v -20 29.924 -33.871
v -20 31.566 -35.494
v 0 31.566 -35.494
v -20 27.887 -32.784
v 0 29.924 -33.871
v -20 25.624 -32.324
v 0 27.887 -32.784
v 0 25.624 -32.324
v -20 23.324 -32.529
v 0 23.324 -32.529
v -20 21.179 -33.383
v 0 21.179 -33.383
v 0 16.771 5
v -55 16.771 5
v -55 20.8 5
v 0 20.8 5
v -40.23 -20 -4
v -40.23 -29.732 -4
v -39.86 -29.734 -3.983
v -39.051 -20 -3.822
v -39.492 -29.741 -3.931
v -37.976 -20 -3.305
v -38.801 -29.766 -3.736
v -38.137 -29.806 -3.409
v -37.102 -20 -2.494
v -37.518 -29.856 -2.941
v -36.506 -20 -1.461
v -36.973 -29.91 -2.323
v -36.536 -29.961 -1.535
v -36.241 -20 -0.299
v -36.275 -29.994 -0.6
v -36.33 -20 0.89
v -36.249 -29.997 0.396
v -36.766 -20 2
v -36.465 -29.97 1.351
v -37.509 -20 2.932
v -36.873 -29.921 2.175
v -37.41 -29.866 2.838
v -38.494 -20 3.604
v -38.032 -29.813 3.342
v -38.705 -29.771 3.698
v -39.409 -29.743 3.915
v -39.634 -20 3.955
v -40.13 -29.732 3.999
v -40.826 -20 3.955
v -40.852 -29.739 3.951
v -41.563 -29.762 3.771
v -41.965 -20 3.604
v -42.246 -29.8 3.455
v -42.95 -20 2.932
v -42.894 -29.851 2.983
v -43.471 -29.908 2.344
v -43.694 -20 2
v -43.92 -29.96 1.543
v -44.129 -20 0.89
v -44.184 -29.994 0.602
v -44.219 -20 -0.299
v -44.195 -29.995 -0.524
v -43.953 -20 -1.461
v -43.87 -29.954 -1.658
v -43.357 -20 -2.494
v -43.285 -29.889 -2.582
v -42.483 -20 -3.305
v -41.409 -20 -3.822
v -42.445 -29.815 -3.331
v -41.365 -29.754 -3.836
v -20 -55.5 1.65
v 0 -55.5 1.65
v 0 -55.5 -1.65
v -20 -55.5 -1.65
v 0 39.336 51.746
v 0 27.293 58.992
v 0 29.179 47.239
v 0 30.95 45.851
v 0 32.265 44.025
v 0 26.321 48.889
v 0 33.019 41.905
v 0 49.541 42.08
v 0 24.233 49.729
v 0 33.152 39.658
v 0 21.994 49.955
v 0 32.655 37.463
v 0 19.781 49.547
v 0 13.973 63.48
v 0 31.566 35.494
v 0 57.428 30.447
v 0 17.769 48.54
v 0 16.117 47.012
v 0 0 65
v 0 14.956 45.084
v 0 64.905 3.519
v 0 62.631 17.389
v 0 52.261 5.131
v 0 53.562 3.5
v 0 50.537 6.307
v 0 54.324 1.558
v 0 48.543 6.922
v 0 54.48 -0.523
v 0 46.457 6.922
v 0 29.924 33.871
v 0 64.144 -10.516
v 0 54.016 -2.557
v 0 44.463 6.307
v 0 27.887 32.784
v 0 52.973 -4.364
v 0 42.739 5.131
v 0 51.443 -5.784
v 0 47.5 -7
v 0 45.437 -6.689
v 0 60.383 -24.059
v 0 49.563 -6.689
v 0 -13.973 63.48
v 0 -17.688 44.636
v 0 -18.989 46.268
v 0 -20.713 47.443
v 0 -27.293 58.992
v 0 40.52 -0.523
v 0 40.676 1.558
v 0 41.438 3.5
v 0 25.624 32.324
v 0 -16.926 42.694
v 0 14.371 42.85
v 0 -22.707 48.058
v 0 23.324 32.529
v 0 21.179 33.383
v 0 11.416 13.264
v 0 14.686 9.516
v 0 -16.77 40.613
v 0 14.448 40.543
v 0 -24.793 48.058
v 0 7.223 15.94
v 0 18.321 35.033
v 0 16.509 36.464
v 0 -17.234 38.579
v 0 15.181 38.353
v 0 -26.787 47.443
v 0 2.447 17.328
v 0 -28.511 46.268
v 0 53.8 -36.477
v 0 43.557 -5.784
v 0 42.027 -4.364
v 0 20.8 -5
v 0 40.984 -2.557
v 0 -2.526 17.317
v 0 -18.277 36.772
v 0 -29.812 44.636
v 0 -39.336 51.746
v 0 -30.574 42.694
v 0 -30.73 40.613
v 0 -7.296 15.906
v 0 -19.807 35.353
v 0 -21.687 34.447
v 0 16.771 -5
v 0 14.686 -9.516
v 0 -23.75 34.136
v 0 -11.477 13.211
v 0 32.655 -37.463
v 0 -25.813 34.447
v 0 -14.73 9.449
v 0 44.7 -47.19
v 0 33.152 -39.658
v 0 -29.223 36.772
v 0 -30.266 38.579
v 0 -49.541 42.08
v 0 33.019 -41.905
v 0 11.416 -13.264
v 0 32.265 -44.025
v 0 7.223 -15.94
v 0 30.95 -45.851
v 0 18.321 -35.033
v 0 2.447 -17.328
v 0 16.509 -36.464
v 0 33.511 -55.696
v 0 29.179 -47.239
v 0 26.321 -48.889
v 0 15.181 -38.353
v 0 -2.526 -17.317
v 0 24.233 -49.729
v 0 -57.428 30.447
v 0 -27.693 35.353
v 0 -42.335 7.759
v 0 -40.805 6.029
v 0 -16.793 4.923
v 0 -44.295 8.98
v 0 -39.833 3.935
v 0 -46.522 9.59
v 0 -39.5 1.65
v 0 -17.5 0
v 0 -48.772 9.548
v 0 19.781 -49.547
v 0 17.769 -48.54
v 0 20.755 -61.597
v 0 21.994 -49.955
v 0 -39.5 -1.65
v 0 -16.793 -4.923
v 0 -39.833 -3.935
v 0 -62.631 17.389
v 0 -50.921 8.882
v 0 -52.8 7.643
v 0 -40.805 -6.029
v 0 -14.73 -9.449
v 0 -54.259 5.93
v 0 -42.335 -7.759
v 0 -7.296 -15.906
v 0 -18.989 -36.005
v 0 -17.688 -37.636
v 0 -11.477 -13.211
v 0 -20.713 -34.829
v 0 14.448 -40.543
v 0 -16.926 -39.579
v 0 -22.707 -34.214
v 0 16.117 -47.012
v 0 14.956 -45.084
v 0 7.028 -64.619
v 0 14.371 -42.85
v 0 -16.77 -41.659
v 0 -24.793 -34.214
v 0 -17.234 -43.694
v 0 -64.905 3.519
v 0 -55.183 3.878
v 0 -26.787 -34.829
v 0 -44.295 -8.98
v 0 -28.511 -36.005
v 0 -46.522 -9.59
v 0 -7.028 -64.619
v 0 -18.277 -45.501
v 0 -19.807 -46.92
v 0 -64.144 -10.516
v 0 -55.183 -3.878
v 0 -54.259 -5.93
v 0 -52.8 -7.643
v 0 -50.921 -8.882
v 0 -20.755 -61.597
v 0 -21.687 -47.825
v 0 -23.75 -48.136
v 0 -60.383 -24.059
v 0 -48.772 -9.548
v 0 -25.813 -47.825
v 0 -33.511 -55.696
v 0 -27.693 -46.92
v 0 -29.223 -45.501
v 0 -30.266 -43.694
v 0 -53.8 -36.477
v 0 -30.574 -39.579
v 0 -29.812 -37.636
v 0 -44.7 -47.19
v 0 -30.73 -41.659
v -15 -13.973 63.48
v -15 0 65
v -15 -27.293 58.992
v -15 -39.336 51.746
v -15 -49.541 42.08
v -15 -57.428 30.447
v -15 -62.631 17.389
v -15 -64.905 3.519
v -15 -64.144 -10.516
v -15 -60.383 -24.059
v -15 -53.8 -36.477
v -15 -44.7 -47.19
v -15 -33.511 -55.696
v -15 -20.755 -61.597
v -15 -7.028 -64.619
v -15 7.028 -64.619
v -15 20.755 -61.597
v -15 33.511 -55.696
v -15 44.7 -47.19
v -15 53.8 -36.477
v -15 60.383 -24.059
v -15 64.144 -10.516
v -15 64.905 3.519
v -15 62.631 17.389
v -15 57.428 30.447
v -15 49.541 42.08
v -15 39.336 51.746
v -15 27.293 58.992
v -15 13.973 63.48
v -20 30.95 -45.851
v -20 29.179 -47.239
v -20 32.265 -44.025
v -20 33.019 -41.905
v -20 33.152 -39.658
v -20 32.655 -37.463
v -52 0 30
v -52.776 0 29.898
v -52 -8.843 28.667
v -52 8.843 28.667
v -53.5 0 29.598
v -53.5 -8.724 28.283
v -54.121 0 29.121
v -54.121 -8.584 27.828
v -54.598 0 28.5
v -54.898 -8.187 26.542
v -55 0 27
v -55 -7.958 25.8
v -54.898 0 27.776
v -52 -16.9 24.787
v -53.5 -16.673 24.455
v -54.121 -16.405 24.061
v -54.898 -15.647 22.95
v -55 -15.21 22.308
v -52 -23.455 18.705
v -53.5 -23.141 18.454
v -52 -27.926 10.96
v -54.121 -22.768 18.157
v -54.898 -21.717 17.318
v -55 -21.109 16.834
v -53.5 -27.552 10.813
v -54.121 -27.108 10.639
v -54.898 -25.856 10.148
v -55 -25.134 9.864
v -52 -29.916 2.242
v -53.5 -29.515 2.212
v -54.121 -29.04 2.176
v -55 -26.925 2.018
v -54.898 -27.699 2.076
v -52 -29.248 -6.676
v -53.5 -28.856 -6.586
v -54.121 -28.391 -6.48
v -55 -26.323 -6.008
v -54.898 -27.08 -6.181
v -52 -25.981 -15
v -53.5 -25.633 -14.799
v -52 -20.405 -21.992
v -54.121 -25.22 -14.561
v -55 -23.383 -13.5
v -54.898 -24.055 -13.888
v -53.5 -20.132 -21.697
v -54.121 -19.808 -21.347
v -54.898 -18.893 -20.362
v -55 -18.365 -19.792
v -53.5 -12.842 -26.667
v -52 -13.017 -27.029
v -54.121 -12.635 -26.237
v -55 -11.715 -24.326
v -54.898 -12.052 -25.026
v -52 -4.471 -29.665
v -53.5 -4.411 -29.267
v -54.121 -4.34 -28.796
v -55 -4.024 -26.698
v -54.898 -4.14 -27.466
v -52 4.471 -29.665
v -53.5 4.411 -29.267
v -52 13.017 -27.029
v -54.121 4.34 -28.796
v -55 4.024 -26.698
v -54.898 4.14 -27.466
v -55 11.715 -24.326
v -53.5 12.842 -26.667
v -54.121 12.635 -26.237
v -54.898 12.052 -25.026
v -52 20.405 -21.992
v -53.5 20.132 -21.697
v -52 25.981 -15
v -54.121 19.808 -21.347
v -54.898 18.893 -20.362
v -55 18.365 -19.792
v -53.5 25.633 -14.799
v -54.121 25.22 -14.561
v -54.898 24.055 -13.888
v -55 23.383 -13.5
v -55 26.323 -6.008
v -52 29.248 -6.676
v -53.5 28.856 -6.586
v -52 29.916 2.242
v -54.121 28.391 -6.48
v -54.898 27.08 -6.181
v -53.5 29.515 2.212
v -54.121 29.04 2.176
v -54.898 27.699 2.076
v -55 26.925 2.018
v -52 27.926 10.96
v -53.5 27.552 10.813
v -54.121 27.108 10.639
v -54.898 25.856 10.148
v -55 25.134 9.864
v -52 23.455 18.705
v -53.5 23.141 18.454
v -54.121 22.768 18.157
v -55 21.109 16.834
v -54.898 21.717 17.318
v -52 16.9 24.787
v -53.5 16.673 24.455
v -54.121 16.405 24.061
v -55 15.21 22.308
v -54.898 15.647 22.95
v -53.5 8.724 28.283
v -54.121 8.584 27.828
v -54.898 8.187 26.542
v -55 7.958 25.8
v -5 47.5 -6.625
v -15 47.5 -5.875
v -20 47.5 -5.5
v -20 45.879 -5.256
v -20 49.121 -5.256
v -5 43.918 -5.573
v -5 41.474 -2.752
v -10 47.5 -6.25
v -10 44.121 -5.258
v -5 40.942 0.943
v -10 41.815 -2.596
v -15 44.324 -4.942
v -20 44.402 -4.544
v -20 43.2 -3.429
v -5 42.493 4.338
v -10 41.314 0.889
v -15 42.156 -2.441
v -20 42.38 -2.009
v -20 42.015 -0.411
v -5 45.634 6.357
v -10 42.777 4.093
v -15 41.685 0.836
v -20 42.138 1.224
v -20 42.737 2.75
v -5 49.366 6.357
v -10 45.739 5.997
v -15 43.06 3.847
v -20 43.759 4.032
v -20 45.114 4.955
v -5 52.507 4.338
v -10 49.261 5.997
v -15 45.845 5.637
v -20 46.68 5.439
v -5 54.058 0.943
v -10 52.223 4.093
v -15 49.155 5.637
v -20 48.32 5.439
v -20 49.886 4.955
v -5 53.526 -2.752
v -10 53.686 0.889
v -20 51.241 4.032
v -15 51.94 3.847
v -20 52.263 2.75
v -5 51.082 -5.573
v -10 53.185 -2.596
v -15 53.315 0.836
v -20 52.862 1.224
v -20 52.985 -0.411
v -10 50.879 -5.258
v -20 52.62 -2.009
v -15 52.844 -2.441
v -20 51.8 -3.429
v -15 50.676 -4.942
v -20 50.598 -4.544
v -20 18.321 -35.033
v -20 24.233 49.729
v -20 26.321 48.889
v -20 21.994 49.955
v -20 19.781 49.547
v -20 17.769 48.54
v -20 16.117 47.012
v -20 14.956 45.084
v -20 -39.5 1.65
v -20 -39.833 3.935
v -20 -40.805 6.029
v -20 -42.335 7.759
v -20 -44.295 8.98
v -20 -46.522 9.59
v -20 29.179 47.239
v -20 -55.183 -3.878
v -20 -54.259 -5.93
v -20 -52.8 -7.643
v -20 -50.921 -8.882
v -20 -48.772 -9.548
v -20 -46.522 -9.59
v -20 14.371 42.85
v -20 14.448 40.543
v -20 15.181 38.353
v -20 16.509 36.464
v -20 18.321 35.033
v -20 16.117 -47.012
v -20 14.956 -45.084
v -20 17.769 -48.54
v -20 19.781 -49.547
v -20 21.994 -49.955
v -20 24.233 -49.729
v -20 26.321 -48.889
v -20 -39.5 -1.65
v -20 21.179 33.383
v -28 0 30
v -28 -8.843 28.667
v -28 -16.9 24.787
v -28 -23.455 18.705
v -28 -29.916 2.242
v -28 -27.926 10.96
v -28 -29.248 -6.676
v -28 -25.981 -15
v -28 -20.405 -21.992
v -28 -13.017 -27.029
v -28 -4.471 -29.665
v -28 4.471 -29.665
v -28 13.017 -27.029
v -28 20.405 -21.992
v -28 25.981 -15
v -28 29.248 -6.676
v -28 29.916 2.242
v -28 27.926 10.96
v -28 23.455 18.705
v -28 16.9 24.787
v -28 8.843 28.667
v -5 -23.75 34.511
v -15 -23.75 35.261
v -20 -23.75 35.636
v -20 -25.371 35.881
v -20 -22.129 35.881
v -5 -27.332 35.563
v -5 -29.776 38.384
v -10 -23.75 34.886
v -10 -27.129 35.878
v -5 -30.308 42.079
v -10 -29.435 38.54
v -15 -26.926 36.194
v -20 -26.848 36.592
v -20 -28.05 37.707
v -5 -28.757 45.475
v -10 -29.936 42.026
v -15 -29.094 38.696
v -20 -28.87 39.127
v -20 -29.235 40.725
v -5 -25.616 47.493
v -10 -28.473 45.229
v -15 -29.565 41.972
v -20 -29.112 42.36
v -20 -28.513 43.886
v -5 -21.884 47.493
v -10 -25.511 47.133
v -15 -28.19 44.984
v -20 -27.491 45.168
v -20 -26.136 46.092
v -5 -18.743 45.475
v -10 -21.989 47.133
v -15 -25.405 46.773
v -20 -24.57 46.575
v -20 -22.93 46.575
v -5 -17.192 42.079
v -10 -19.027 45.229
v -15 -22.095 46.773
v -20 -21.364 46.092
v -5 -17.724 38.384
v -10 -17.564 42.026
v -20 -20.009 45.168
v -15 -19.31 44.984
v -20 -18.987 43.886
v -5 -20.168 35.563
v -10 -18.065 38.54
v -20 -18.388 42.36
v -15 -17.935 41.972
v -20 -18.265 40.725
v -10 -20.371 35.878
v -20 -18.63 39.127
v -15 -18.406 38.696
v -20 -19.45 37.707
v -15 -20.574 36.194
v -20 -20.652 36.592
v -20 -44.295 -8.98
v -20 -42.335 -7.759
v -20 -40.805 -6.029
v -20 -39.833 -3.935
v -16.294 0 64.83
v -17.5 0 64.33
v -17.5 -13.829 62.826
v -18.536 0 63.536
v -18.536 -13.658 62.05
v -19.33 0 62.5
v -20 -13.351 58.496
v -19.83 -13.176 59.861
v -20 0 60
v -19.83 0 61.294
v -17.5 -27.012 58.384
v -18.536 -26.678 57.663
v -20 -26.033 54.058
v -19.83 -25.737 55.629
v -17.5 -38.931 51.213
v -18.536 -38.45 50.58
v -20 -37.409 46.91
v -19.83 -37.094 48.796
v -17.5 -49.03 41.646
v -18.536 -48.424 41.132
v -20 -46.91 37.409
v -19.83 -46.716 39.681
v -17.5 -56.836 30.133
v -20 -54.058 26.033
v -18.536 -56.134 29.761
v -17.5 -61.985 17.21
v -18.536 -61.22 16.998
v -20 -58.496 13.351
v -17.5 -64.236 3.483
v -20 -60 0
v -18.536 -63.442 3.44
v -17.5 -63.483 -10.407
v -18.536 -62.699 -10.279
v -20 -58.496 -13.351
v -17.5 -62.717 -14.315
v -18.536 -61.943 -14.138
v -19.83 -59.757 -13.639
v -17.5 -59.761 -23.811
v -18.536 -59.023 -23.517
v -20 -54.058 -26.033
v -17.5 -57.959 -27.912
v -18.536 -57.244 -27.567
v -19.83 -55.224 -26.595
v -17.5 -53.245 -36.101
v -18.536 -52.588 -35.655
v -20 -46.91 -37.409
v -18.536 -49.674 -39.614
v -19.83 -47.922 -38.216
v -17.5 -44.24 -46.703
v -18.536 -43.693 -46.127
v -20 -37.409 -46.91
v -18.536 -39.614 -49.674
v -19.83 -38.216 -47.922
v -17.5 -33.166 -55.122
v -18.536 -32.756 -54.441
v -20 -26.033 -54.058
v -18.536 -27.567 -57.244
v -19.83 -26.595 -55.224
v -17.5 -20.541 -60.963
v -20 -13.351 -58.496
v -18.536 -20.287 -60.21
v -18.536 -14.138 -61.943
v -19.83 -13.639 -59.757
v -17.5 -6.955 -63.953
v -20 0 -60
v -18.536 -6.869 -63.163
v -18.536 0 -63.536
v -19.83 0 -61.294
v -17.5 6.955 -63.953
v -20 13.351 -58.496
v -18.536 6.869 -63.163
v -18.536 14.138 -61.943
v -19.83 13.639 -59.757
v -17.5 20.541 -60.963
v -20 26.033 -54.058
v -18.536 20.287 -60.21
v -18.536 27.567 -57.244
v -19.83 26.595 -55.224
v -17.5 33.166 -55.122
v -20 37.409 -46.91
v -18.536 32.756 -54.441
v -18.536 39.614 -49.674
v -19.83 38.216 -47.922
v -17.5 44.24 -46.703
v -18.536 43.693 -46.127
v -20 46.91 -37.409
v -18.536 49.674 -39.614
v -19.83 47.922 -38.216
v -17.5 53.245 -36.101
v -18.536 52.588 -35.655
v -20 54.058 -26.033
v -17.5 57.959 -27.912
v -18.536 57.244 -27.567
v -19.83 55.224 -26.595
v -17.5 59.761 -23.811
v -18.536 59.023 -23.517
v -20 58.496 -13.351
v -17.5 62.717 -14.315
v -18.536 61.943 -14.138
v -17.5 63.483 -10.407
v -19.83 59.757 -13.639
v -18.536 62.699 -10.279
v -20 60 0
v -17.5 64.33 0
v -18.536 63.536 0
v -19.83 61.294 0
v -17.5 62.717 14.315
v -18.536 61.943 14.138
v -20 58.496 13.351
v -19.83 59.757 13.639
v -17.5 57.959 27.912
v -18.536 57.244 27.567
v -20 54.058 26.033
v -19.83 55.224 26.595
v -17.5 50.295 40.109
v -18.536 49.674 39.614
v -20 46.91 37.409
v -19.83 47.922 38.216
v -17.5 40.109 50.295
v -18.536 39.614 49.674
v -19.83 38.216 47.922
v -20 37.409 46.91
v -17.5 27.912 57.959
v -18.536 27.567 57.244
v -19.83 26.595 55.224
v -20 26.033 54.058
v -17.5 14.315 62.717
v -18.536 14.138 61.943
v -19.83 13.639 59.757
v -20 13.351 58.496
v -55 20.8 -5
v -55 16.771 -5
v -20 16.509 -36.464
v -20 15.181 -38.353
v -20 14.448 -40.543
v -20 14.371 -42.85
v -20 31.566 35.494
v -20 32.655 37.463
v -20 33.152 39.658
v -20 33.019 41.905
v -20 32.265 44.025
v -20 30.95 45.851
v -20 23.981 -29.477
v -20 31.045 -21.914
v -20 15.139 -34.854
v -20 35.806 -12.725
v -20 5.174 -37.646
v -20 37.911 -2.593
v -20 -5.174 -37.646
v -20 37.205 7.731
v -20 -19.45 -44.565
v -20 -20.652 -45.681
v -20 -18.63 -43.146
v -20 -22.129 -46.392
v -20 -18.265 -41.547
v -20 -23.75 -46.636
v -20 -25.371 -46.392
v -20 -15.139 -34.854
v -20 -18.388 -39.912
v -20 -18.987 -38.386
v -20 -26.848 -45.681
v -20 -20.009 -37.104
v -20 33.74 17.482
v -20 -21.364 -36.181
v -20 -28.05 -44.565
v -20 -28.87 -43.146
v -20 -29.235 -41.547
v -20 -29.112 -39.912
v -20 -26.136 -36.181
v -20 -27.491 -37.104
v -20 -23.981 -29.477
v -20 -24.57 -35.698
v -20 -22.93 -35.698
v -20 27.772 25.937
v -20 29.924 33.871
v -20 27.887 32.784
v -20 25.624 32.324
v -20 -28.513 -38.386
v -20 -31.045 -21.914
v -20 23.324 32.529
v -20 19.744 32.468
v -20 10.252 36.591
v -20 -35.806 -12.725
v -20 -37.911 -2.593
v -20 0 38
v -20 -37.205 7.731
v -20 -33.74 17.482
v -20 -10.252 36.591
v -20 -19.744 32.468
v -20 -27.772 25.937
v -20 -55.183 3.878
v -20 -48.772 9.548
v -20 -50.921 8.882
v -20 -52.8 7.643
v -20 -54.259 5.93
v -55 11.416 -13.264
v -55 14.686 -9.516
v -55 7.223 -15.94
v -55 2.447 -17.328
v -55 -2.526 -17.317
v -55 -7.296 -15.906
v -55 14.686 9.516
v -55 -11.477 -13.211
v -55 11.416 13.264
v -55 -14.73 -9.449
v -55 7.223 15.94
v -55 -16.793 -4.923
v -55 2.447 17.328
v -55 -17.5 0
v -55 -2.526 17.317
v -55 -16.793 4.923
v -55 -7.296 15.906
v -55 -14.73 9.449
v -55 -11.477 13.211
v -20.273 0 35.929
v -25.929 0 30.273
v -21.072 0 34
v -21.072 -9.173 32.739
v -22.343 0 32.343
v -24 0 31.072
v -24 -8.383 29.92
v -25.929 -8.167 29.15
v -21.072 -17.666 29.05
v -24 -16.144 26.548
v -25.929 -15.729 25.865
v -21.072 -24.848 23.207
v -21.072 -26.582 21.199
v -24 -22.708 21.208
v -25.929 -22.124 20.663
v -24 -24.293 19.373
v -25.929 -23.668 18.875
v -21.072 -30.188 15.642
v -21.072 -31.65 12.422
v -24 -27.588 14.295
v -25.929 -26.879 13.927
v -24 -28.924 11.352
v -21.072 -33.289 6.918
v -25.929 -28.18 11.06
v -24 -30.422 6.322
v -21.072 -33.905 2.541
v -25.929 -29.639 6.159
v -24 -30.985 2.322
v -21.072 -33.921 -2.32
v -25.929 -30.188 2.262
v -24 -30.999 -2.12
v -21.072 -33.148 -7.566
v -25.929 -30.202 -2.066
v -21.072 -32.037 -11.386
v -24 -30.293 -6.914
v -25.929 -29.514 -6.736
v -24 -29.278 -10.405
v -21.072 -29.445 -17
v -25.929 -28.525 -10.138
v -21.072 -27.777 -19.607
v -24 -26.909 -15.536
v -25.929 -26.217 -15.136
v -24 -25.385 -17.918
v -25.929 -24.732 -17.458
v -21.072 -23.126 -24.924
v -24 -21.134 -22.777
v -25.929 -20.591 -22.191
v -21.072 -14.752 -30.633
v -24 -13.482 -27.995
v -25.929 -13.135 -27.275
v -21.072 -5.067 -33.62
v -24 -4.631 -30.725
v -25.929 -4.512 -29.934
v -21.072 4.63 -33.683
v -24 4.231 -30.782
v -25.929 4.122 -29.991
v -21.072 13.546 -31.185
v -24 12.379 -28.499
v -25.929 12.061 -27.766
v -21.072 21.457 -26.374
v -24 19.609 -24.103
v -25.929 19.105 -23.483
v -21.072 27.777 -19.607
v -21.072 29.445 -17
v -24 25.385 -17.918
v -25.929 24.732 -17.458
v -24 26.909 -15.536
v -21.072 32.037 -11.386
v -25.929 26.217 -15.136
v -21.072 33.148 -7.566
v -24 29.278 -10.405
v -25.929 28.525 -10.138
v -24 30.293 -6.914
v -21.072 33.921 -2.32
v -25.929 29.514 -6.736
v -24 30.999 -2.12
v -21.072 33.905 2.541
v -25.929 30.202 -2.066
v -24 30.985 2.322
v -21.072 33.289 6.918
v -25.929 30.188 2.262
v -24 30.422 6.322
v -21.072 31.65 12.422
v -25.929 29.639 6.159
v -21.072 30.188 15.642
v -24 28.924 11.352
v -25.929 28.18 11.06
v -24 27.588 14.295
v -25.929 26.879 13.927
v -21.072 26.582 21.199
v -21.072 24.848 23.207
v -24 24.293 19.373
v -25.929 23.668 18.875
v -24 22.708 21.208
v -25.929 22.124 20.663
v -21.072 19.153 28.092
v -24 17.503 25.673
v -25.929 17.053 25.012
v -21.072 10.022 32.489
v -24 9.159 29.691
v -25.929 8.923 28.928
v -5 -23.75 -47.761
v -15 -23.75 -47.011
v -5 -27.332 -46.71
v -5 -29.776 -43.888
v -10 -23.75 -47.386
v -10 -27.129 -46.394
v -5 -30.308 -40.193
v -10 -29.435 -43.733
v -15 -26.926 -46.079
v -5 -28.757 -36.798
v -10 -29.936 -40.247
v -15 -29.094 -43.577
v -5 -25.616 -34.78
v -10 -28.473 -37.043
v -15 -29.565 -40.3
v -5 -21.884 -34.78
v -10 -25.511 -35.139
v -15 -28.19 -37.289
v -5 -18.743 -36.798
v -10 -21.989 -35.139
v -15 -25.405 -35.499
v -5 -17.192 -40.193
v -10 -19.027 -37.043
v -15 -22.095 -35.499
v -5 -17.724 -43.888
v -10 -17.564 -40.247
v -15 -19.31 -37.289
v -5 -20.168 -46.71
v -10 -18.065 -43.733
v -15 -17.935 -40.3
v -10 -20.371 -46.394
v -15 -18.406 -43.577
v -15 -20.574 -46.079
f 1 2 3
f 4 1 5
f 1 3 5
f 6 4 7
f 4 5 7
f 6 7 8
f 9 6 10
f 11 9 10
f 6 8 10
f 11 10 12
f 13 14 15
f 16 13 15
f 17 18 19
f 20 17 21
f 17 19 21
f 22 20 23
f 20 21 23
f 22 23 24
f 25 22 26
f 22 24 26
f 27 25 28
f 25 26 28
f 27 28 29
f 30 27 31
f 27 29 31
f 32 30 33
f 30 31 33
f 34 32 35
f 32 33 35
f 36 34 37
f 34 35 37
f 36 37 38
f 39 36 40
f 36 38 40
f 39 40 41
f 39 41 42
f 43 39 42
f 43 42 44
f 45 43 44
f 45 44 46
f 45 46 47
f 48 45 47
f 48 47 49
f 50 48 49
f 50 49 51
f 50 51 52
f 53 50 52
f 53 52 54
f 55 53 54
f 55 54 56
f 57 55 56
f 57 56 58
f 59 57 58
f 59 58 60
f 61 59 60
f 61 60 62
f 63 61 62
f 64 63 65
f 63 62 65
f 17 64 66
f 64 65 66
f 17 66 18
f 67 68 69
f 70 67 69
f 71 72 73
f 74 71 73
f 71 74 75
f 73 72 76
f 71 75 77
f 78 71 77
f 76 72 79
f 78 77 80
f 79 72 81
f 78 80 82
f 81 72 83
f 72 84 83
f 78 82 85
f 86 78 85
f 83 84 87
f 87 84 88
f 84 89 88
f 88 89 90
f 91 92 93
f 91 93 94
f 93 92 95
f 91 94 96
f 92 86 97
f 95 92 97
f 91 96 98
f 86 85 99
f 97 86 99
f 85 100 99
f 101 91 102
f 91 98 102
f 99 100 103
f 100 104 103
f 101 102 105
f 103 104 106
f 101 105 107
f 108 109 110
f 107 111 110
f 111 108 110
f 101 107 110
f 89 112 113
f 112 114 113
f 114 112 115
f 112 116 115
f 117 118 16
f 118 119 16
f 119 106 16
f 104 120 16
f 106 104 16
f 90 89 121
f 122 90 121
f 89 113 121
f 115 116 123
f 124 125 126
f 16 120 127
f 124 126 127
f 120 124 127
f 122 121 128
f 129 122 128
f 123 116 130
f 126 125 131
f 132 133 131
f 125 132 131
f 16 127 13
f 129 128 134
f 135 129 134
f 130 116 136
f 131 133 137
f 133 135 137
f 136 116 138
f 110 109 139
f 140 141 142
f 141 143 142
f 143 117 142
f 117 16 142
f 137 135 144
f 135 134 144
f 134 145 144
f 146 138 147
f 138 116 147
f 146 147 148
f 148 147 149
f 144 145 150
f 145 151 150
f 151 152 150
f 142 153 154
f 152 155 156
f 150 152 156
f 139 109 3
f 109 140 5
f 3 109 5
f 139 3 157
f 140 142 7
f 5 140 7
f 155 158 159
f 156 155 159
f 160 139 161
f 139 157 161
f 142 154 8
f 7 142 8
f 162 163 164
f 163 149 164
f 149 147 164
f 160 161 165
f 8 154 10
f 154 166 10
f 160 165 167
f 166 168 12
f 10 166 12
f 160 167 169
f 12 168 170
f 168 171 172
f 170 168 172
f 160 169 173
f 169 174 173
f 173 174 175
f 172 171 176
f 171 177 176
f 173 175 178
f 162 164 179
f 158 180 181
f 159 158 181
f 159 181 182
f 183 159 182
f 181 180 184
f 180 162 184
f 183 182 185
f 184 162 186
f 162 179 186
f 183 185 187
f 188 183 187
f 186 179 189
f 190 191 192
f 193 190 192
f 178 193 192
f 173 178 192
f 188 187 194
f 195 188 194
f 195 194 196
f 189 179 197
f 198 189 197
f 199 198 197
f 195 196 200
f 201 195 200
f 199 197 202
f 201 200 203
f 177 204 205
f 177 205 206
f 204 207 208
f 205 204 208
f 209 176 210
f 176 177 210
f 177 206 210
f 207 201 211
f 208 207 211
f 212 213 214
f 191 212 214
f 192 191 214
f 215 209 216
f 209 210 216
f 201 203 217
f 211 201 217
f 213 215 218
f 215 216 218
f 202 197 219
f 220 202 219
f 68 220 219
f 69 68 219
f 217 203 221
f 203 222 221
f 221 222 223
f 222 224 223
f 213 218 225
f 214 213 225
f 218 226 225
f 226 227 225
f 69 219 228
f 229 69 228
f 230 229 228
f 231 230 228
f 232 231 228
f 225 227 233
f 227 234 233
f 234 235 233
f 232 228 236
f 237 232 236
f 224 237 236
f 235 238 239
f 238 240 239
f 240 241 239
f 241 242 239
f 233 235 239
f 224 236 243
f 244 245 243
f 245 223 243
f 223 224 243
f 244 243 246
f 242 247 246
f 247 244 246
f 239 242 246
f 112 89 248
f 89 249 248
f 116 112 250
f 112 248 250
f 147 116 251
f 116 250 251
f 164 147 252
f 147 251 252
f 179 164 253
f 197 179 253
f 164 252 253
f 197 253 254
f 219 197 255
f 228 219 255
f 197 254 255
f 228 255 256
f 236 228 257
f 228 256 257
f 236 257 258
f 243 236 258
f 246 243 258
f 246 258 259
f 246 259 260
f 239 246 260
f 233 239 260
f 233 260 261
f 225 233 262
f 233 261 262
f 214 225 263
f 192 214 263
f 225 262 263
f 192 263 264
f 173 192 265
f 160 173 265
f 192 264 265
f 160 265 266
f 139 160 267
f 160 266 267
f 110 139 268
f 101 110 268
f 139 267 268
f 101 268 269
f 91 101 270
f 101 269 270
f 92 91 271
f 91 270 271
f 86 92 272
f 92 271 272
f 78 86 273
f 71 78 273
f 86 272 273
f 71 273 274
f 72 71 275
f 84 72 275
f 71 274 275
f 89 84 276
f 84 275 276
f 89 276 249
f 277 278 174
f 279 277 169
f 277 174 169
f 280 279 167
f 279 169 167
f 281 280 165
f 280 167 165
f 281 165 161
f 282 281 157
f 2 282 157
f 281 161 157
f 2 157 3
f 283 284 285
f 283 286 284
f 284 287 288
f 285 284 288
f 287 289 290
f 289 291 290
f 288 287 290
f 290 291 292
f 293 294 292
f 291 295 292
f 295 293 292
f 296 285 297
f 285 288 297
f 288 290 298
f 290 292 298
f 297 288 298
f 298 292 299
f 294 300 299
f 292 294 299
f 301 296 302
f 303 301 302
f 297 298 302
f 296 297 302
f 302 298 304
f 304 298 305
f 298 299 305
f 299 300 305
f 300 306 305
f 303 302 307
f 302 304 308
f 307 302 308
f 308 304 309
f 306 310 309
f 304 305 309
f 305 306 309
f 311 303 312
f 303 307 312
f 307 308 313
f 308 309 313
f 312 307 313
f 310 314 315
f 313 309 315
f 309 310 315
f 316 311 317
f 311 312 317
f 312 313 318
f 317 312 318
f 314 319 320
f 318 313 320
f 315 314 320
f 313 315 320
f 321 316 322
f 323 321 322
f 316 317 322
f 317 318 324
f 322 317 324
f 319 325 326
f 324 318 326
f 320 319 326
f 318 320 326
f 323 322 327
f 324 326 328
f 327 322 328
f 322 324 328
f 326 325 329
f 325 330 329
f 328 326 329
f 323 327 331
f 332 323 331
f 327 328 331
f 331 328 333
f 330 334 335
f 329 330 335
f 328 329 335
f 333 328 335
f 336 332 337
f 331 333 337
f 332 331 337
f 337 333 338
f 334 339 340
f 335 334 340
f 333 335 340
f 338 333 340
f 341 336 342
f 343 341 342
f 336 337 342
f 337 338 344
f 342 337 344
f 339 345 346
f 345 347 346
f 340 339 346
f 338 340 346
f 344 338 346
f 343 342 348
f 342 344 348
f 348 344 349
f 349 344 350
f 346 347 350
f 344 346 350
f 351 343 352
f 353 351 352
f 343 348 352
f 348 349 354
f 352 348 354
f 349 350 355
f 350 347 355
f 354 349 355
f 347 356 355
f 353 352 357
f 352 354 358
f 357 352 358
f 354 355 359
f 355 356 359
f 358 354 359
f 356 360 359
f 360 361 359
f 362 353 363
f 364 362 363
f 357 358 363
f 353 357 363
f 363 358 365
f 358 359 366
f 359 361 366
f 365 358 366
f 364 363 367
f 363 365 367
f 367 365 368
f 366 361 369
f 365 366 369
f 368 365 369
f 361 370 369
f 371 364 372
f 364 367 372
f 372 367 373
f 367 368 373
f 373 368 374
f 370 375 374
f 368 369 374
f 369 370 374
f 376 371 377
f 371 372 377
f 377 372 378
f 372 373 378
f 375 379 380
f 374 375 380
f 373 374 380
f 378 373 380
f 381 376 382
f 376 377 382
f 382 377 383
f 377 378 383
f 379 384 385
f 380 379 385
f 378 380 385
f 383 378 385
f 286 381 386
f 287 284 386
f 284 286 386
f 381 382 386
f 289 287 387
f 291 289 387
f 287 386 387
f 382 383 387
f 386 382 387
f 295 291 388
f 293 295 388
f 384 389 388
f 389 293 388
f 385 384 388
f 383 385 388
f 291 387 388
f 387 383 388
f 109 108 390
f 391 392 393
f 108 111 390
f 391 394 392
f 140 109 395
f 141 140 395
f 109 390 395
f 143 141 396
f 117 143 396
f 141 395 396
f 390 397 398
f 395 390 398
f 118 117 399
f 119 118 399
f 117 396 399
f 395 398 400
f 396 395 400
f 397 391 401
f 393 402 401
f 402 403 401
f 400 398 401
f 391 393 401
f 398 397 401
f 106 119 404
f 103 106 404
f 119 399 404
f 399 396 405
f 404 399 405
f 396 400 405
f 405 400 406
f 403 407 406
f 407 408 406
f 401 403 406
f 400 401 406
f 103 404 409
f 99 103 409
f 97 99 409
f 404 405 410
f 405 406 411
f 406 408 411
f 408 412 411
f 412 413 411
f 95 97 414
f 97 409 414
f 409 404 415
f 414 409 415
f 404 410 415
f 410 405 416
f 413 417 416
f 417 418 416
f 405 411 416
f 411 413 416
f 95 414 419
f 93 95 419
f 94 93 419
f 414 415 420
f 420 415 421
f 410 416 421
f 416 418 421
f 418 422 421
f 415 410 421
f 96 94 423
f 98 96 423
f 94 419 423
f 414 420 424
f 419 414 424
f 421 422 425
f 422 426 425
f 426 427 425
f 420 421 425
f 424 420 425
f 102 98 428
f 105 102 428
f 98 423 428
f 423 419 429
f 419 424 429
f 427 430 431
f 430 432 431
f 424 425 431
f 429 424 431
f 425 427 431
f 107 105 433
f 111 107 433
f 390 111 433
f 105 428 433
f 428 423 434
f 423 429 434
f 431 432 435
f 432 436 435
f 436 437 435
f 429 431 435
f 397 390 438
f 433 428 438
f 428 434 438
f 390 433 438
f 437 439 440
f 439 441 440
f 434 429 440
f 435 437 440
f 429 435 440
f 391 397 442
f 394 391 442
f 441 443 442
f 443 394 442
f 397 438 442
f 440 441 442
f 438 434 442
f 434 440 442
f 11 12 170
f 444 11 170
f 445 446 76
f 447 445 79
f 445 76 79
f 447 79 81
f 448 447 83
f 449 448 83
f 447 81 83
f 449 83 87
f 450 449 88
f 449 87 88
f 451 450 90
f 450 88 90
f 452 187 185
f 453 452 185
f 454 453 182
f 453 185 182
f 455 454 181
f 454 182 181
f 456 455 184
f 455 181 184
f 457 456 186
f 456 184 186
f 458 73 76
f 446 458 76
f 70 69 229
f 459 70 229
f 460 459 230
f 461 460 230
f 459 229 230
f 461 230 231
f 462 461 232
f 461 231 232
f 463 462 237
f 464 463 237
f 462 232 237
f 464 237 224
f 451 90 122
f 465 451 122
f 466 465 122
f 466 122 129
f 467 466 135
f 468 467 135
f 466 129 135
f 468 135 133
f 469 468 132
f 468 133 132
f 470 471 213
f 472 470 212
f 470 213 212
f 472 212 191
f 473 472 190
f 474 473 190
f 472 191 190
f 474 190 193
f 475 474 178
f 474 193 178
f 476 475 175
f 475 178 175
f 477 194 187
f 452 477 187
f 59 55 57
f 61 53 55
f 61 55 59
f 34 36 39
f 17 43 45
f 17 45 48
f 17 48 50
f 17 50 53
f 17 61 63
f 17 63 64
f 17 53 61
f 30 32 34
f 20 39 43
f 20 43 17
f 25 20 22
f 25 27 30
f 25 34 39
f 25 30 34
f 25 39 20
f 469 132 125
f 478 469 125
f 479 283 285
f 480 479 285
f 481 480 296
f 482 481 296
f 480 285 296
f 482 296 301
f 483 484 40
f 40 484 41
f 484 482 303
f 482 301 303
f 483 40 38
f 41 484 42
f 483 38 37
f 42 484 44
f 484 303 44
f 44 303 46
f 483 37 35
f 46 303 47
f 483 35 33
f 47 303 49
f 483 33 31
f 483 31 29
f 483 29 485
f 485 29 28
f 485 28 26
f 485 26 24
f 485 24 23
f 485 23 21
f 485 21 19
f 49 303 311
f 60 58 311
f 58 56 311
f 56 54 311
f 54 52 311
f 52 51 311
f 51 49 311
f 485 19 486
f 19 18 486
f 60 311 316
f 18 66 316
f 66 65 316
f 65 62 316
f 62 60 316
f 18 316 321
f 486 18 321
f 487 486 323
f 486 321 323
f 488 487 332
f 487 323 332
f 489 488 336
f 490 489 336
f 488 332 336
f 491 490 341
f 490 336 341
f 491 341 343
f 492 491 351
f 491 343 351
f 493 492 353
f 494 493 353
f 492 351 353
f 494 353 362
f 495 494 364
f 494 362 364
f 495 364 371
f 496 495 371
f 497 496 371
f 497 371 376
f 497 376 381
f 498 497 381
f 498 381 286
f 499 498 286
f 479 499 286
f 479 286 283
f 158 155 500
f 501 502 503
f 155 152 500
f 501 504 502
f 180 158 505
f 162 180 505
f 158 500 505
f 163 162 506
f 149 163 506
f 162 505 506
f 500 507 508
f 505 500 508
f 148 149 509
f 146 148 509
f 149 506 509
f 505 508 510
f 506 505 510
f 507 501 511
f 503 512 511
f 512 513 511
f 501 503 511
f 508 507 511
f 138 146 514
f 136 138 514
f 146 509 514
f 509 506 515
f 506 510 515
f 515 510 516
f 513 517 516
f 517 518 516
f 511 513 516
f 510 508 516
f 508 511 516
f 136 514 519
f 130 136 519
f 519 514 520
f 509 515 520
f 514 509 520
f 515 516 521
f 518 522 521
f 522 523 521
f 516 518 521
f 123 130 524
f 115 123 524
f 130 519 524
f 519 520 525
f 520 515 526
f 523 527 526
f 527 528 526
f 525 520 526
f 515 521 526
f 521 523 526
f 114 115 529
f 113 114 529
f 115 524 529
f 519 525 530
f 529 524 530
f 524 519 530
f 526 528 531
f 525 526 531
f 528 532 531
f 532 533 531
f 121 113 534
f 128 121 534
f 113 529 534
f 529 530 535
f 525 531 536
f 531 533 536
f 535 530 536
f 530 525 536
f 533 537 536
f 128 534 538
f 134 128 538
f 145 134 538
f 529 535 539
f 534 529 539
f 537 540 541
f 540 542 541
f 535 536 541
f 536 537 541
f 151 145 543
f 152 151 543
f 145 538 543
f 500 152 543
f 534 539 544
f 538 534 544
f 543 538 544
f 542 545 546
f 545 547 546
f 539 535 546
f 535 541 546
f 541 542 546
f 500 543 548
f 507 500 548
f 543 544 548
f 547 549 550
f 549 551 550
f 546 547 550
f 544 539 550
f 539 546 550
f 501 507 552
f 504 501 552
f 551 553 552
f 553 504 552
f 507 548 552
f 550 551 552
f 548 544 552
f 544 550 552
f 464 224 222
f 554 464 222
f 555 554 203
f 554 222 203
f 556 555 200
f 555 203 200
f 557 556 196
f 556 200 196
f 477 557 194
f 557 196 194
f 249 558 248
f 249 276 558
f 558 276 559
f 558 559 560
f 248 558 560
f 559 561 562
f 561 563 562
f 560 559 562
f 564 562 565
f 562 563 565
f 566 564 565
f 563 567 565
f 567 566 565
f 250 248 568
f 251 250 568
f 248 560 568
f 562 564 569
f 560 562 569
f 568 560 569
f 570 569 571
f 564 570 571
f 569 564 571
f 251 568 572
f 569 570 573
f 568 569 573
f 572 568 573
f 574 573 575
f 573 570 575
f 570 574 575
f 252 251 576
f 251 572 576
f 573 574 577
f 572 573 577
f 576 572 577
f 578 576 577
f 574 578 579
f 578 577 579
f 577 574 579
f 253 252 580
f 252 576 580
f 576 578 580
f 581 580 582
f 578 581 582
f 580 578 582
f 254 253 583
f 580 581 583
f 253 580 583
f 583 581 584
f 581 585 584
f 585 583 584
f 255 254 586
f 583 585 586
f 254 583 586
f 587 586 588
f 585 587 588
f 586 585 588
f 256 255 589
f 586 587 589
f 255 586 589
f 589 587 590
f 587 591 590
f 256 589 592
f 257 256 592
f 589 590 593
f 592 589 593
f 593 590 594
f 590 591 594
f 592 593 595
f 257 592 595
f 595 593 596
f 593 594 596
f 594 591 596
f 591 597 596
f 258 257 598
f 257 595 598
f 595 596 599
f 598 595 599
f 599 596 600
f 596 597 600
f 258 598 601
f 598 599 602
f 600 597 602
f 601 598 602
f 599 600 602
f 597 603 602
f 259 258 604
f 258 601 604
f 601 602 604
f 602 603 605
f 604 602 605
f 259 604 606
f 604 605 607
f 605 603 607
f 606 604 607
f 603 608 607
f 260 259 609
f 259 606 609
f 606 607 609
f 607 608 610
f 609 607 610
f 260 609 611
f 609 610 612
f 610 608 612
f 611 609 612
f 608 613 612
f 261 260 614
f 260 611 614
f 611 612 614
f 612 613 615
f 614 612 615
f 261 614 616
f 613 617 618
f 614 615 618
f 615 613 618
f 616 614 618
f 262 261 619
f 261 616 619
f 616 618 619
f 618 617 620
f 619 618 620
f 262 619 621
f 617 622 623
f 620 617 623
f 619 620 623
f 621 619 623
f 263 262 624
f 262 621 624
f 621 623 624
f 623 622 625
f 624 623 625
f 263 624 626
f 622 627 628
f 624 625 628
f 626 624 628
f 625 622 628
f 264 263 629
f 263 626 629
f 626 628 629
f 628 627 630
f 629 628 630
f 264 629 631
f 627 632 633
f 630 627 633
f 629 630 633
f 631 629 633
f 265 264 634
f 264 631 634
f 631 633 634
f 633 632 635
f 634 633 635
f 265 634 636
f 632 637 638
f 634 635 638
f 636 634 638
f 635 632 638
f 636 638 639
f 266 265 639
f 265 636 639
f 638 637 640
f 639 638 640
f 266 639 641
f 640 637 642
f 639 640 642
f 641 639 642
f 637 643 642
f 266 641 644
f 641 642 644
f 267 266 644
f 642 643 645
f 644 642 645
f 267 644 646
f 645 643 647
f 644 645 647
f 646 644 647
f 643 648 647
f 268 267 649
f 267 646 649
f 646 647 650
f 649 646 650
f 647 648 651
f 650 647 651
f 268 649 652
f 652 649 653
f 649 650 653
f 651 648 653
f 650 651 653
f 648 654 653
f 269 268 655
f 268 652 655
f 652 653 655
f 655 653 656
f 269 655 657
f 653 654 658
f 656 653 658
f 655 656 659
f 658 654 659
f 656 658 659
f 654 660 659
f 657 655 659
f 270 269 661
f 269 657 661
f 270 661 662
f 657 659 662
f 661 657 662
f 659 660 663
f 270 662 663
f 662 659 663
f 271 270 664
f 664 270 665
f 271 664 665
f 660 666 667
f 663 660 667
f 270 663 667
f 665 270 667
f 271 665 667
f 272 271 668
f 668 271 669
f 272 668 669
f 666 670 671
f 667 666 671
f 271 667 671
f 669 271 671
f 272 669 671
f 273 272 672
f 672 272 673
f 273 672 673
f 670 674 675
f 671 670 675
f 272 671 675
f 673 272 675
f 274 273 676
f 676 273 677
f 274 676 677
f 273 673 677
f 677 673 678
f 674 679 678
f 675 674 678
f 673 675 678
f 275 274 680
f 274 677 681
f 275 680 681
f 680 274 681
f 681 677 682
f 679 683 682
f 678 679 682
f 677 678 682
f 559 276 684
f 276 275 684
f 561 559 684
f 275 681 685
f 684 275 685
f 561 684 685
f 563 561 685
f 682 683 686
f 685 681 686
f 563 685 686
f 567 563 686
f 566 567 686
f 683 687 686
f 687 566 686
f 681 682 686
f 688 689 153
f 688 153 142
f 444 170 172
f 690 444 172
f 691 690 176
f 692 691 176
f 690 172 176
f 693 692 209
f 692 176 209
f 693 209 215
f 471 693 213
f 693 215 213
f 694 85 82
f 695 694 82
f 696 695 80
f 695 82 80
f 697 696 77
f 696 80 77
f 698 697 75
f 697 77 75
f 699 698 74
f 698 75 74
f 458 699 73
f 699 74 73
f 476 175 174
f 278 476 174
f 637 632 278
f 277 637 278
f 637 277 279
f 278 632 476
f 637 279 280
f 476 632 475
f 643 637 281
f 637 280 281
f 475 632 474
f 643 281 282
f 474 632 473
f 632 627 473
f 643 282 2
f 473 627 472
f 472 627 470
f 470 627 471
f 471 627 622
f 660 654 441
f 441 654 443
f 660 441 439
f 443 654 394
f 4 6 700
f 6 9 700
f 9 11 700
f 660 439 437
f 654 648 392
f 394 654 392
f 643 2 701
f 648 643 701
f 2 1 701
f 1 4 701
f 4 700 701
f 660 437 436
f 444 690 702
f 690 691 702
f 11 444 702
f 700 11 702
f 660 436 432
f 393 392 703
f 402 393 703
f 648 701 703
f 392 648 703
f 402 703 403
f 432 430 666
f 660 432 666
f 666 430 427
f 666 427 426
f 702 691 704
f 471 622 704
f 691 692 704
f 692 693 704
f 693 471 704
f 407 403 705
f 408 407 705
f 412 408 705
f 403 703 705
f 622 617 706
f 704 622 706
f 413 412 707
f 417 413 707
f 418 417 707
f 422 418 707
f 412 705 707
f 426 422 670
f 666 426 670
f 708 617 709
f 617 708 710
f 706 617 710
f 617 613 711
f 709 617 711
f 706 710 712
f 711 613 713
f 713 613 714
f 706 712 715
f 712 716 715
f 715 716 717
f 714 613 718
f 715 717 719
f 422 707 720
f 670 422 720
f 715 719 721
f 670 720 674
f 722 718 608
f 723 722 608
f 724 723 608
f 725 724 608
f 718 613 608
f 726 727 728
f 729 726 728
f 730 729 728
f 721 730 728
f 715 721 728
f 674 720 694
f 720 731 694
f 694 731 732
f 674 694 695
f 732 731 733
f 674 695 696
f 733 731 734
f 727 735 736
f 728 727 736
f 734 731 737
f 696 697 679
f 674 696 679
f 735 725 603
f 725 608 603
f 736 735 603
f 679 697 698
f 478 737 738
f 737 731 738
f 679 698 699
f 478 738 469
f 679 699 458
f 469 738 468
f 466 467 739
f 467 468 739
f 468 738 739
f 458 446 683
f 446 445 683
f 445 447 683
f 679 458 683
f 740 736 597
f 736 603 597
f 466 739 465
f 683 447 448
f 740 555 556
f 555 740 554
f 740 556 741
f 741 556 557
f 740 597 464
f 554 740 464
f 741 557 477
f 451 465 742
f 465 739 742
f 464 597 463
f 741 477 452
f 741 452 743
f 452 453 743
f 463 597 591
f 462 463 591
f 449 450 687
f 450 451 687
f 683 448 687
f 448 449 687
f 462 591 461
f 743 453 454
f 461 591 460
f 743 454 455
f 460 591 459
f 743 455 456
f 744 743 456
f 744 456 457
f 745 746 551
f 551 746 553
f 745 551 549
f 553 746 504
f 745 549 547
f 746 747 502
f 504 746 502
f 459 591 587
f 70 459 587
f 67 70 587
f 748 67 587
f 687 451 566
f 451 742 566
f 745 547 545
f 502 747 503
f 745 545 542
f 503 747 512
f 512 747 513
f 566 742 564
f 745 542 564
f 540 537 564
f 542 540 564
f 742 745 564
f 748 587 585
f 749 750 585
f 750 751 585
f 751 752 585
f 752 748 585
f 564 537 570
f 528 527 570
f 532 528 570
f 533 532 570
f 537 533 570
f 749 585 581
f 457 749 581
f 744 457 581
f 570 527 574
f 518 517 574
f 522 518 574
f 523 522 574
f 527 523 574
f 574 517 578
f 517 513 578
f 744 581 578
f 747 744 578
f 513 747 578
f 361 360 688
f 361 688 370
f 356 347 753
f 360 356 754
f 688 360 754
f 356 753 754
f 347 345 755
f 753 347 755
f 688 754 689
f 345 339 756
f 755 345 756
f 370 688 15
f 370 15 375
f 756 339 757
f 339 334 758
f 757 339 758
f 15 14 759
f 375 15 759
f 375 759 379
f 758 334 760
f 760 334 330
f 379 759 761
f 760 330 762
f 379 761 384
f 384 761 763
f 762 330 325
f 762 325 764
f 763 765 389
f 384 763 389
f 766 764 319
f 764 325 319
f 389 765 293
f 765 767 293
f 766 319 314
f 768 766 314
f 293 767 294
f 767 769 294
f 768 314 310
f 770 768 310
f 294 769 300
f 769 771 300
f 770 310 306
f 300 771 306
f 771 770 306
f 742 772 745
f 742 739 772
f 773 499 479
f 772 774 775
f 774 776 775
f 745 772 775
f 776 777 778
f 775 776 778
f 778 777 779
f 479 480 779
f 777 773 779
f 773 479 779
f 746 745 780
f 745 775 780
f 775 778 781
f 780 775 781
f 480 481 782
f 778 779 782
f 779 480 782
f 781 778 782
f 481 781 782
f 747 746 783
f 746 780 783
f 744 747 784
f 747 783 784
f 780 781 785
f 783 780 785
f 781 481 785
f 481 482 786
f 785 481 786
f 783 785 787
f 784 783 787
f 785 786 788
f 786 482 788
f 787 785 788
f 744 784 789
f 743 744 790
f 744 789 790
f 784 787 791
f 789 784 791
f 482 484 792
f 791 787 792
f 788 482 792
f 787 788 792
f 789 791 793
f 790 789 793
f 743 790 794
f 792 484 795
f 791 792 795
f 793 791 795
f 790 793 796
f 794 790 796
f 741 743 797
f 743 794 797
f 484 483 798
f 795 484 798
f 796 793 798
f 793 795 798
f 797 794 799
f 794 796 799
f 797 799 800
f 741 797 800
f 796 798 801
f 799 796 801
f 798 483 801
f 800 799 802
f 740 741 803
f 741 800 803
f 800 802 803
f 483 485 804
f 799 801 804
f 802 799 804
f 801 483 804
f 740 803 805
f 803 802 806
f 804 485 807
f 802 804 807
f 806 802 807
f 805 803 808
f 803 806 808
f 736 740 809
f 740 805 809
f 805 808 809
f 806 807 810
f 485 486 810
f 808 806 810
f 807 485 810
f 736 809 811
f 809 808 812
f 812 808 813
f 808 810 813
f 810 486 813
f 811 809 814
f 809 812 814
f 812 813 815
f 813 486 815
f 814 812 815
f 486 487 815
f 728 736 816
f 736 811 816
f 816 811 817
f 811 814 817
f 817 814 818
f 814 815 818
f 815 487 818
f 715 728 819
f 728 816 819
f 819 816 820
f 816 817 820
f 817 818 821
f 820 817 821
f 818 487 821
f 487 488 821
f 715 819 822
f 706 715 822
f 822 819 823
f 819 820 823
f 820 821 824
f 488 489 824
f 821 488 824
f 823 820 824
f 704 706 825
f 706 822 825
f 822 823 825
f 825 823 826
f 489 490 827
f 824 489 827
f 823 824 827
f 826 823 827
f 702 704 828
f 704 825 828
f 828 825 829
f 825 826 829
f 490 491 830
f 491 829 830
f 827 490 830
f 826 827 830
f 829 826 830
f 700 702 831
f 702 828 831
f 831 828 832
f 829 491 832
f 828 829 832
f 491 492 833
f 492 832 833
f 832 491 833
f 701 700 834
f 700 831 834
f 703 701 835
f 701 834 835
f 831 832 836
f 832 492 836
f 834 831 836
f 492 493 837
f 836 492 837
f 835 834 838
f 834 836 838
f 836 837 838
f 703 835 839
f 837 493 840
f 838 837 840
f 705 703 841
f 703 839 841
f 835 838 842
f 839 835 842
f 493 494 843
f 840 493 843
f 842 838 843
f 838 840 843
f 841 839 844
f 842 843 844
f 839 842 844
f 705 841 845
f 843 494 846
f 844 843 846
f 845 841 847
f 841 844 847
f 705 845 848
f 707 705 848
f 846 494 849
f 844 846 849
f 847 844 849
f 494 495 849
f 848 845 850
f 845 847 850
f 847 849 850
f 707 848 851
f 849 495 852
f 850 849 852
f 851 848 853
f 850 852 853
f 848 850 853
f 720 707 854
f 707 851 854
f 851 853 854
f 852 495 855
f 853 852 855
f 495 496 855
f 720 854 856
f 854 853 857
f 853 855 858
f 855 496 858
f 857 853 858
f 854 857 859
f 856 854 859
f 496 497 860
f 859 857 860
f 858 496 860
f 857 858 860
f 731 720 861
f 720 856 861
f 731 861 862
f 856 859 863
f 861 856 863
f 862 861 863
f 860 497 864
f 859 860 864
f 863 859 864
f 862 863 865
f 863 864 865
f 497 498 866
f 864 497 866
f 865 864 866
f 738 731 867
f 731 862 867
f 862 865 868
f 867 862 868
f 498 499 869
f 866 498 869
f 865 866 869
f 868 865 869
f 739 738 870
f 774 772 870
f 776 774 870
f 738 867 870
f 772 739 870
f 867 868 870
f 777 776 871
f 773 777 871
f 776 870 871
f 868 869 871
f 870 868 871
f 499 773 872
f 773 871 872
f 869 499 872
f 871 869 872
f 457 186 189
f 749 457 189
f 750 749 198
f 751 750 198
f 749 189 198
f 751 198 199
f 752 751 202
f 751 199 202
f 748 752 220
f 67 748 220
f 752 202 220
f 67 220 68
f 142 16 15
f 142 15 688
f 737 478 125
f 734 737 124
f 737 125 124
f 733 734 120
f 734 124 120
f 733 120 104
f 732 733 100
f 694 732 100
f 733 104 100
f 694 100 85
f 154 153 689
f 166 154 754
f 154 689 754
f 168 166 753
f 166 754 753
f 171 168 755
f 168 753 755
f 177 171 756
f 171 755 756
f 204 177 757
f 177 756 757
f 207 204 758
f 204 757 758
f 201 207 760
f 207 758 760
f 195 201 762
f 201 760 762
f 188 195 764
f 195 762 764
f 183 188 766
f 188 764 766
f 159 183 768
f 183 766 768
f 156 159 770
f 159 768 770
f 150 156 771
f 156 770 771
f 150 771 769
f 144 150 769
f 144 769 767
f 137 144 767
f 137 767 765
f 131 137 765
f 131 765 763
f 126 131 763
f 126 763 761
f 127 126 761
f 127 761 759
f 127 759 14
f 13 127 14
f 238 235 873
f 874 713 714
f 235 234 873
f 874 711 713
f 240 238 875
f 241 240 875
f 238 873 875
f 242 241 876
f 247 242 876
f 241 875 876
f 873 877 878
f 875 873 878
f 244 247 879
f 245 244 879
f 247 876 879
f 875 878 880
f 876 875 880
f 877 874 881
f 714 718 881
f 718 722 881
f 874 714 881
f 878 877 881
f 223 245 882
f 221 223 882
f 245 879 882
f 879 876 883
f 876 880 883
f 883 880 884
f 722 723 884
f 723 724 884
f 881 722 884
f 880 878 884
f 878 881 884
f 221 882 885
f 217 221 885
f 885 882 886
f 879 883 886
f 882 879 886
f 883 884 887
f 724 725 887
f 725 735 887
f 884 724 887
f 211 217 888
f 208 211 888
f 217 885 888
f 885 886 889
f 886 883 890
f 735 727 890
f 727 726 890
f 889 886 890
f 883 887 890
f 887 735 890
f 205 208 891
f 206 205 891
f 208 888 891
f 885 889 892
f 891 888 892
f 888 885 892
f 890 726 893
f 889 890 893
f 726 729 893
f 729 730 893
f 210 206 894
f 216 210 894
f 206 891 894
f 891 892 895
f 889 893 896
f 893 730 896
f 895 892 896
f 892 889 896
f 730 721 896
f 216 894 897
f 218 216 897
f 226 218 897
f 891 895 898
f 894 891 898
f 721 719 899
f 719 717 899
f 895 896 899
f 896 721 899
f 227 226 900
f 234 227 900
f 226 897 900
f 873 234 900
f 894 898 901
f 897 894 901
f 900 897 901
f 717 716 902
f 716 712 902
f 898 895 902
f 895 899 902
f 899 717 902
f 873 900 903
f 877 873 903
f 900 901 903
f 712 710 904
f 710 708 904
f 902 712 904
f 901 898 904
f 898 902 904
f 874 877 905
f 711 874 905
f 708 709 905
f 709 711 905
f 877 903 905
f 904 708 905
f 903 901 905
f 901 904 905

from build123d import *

# Parameters (mm, degrees)
SKETCH2_R          = 17.5
CUT_EXTRUDE1_DEPTH = 108.12142655
SKETCH3_W          = 10
SKETCH3_H          = 6.6
CUT_EXTRUDE2_DEPTH = 108.12142655
SKETCH4_R          = 4
CUT_EXTRUDE3_DEPTH = 10
CUT_EXTRUDE4_DEPTH = 108.12142655


with BuildPart() as part:
    # Sketch1 → Revolve1 (revolve)
    with BuildSketch(Plane.XY):
        with BuildLine():
            Line((-55, 0), (0, 0))
            Line((0, 0), (0, 65))
            Line((0, 65), (-15, 65))
            ThreePointArc((-15, 65), (-18.535533906, 63.535533906), (-20, 60))
            Line((-20, 60), (-20, 38))
            ThreePointArc((-20, 38), (-22.343145751, 32.343145751), (-28, 30))
            Line((-28, 30), (-52, 30))
            ThreePointArc((-52, 30), (-54.121320344, 29.121320344), (-55, 27))
            Line((-55, 27), (-55, 0))
        make_face()
    revolve(axis=Axis((-55, 0, 0), (1, 0, 0)))

    # Sketch2 → Cut-Extrude1 (cut, through all)
    with BuildSketch(Plane.ZY.offset(55)):
        Circle(SKETCH2_R)
    extrude(amount=-CUT_EXTRUDE1_DEPTH, mode=Mode.SUBTRACT)

    # Sketch3 → Cut-Extrude2 (cut, through all)
    with BuildSketch(Plane(origin=(0, 0, 0), x_dir=(0, 0, -1), z_dir=(1, 0, 0))):
        with Locations((0, 17.5)):
            Rectangle(SKETCH3_W, SKETCH3_H)
    extrude(amount=-CUT_EXTRUDE2_DEPTH, mode=Mode.SUBTRACT)

    # Sketch4 → Cut-Extrude3 (cut)
    with BuildSketch(Plane(origin=(0, -30, 0), x_dir=(-1, 0, 0), z_dir=(0, -1, 0))):
        with Locations((40.229772479, 0)):
            Circle(SKETCH4_R)
    extrude(amount=-CUT_EXTRUDE3_DEPTH, mode=Mode.SUBTRACT)

    # Sketch5 → Cut-Extrude4 (cut, through all)
    with BuildSketch(Plane(origin=(0, 0, 0), x_dir=(0, 0, -1), z_dir=(1, 0, 0))):
        with BuildLine():
            Line((1.65, -39.5), (-1.65, -39.5))
            ThreePointArc((-1.65, -39.5), (-9.65, -47.5), (-1.65, -55.5))
            Line((-1.65, -55.5), (1.65, -55.5))
            ThreePointArc((1.65, -55.5), (9.65, -47.5), (1.65, -39.5))
        make_face()
        with BuildLine():
            ThreePointArc((-48.88940991, 26.321058084), (-45.96120668, 15.392854853), (-35.033003449, 18.321058084))
            Line((-35.033003449, 18.321058084), (-33.383003449, 21.178941916))
            ThreePointArc((-33.383003449, 21.178941916), (-36.31120668, 32.107145147), (-47.23940991, 29.178941916))
            Line((-47.23940991, 29.178941916), (-48.88940991, 26.321058084))
        make_face()
        with BuildLine():
            ThreePointArc((35.033003449, 18.321058084), (45.96120668, 15.392854853), (48.88940991, 26.321058084))
            Line((48.88940991, 26.321058084), (47.23940991, 29.178941916))
            ThreePointArc((47.23940991, 29.178941916), (36.31120668, 32.107145147), (33.383003449, 21.178941916))
            Line((33.383003449, 21.178941916), (35.033003449, 18.321058084))
        make_face()
    extrude(amount=-CUT_EXTRUDE4_DEPTH, mode=Mode.SUBTRACT)

    # Cut-Extrude5 cone 1 section (through the dimple's axis) → Cut-Extrude5 (revolve, cut)
    with BuildSketch(Plane(origin=(0, -23.75, 41.13620668), x_dir=(0, 0, -1), z_dir=(0, 1, 0))):
        Polygon((0, 0), (7, 0), (0, 93.336682434), align=None)
    revolve(axis=Axis((0, -23.75, 41.13620668), (-1, 0, 0)), mode=Mode.SUBTRACT)

    # Cut-Extrude5 cone 2 section (through the dimple's axis) → Cut-Extrude5 cone 2 (revolve, cut)
    with BuildSketch(Plane(origin=(0, -23.75, -41.13620668), x_dir=(0, 0, -1), z_dir=(0, 1, 0))):
        Polygon((0, 0), (7, 0), (0, 93.336682434), align=None)
    revolve(axis=Axis((0, -23.75, -41.13620668), (-1, 0, 0)), mode=Mode.SUBTRACT)

    # Cut-Extrude5 cone 3 section (through the dimple's axis) → Cut-Extrude5 cone 3 (revolve, cut)
    with BuildSketch(Plane(origin=(0, 47.5, 0), x_dir=(0, 0, -1), z_dir=(0, 1, 0))):
        Polygon((0, 0), (7, 0), (0, 93.336682434), align=None)
    revolve(axis=Axis((0, 47.5, 0), (-1, 0, 0)), mode=Mode.SUBTRACT)


solid = part.part
